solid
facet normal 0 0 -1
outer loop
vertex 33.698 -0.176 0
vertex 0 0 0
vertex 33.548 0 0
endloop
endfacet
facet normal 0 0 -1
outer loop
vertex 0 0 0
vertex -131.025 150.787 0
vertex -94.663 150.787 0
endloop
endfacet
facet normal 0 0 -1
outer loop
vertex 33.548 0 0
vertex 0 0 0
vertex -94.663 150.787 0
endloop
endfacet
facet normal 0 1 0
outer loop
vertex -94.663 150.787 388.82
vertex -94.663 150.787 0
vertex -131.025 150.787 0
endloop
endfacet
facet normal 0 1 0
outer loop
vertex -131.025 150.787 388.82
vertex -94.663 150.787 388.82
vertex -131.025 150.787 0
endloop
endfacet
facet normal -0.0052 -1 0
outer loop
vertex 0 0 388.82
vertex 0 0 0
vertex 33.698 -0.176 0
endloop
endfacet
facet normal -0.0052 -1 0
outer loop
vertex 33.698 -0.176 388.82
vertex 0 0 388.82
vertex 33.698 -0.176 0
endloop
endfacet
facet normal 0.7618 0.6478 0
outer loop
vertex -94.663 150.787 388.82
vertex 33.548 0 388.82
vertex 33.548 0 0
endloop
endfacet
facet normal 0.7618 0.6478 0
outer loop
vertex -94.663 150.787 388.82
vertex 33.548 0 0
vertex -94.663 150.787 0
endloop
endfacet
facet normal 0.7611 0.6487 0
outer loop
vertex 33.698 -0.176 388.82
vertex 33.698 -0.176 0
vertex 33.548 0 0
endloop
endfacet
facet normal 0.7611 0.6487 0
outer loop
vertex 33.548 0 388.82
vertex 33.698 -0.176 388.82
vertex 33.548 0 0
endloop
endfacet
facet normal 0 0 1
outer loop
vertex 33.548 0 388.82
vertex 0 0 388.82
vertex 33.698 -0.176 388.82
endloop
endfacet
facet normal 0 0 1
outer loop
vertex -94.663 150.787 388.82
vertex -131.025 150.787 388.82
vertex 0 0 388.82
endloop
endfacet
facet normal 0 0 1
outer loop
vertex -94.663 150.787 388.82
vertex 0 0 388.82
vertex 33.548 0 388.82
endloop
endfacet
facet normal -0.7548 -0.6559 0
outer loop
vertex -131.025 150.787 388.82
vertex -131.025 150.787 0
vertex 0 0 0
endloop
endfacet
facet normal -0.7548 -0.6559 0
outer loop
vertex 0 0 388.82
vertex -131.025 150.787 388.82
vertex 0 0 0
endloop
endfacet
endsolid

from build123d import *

# Parameters (mm, degrees)
F1_DEPTH = 388.820231


with BuildPart() as f1:
    # F0 (on Top) → F1 (new body)
    with BuildSketch(Plane.XY):
        Polygon((33.697896, -0.176251), (33.548033, 0), (0, 0), align=None)
        Polygon((0, 0), (33.548033, 0), (-94.663486, 150.786906), (-131.025478, 150.786906), align=None)
    extrude(amount=F1_DEPTH)


solid = f1.part
